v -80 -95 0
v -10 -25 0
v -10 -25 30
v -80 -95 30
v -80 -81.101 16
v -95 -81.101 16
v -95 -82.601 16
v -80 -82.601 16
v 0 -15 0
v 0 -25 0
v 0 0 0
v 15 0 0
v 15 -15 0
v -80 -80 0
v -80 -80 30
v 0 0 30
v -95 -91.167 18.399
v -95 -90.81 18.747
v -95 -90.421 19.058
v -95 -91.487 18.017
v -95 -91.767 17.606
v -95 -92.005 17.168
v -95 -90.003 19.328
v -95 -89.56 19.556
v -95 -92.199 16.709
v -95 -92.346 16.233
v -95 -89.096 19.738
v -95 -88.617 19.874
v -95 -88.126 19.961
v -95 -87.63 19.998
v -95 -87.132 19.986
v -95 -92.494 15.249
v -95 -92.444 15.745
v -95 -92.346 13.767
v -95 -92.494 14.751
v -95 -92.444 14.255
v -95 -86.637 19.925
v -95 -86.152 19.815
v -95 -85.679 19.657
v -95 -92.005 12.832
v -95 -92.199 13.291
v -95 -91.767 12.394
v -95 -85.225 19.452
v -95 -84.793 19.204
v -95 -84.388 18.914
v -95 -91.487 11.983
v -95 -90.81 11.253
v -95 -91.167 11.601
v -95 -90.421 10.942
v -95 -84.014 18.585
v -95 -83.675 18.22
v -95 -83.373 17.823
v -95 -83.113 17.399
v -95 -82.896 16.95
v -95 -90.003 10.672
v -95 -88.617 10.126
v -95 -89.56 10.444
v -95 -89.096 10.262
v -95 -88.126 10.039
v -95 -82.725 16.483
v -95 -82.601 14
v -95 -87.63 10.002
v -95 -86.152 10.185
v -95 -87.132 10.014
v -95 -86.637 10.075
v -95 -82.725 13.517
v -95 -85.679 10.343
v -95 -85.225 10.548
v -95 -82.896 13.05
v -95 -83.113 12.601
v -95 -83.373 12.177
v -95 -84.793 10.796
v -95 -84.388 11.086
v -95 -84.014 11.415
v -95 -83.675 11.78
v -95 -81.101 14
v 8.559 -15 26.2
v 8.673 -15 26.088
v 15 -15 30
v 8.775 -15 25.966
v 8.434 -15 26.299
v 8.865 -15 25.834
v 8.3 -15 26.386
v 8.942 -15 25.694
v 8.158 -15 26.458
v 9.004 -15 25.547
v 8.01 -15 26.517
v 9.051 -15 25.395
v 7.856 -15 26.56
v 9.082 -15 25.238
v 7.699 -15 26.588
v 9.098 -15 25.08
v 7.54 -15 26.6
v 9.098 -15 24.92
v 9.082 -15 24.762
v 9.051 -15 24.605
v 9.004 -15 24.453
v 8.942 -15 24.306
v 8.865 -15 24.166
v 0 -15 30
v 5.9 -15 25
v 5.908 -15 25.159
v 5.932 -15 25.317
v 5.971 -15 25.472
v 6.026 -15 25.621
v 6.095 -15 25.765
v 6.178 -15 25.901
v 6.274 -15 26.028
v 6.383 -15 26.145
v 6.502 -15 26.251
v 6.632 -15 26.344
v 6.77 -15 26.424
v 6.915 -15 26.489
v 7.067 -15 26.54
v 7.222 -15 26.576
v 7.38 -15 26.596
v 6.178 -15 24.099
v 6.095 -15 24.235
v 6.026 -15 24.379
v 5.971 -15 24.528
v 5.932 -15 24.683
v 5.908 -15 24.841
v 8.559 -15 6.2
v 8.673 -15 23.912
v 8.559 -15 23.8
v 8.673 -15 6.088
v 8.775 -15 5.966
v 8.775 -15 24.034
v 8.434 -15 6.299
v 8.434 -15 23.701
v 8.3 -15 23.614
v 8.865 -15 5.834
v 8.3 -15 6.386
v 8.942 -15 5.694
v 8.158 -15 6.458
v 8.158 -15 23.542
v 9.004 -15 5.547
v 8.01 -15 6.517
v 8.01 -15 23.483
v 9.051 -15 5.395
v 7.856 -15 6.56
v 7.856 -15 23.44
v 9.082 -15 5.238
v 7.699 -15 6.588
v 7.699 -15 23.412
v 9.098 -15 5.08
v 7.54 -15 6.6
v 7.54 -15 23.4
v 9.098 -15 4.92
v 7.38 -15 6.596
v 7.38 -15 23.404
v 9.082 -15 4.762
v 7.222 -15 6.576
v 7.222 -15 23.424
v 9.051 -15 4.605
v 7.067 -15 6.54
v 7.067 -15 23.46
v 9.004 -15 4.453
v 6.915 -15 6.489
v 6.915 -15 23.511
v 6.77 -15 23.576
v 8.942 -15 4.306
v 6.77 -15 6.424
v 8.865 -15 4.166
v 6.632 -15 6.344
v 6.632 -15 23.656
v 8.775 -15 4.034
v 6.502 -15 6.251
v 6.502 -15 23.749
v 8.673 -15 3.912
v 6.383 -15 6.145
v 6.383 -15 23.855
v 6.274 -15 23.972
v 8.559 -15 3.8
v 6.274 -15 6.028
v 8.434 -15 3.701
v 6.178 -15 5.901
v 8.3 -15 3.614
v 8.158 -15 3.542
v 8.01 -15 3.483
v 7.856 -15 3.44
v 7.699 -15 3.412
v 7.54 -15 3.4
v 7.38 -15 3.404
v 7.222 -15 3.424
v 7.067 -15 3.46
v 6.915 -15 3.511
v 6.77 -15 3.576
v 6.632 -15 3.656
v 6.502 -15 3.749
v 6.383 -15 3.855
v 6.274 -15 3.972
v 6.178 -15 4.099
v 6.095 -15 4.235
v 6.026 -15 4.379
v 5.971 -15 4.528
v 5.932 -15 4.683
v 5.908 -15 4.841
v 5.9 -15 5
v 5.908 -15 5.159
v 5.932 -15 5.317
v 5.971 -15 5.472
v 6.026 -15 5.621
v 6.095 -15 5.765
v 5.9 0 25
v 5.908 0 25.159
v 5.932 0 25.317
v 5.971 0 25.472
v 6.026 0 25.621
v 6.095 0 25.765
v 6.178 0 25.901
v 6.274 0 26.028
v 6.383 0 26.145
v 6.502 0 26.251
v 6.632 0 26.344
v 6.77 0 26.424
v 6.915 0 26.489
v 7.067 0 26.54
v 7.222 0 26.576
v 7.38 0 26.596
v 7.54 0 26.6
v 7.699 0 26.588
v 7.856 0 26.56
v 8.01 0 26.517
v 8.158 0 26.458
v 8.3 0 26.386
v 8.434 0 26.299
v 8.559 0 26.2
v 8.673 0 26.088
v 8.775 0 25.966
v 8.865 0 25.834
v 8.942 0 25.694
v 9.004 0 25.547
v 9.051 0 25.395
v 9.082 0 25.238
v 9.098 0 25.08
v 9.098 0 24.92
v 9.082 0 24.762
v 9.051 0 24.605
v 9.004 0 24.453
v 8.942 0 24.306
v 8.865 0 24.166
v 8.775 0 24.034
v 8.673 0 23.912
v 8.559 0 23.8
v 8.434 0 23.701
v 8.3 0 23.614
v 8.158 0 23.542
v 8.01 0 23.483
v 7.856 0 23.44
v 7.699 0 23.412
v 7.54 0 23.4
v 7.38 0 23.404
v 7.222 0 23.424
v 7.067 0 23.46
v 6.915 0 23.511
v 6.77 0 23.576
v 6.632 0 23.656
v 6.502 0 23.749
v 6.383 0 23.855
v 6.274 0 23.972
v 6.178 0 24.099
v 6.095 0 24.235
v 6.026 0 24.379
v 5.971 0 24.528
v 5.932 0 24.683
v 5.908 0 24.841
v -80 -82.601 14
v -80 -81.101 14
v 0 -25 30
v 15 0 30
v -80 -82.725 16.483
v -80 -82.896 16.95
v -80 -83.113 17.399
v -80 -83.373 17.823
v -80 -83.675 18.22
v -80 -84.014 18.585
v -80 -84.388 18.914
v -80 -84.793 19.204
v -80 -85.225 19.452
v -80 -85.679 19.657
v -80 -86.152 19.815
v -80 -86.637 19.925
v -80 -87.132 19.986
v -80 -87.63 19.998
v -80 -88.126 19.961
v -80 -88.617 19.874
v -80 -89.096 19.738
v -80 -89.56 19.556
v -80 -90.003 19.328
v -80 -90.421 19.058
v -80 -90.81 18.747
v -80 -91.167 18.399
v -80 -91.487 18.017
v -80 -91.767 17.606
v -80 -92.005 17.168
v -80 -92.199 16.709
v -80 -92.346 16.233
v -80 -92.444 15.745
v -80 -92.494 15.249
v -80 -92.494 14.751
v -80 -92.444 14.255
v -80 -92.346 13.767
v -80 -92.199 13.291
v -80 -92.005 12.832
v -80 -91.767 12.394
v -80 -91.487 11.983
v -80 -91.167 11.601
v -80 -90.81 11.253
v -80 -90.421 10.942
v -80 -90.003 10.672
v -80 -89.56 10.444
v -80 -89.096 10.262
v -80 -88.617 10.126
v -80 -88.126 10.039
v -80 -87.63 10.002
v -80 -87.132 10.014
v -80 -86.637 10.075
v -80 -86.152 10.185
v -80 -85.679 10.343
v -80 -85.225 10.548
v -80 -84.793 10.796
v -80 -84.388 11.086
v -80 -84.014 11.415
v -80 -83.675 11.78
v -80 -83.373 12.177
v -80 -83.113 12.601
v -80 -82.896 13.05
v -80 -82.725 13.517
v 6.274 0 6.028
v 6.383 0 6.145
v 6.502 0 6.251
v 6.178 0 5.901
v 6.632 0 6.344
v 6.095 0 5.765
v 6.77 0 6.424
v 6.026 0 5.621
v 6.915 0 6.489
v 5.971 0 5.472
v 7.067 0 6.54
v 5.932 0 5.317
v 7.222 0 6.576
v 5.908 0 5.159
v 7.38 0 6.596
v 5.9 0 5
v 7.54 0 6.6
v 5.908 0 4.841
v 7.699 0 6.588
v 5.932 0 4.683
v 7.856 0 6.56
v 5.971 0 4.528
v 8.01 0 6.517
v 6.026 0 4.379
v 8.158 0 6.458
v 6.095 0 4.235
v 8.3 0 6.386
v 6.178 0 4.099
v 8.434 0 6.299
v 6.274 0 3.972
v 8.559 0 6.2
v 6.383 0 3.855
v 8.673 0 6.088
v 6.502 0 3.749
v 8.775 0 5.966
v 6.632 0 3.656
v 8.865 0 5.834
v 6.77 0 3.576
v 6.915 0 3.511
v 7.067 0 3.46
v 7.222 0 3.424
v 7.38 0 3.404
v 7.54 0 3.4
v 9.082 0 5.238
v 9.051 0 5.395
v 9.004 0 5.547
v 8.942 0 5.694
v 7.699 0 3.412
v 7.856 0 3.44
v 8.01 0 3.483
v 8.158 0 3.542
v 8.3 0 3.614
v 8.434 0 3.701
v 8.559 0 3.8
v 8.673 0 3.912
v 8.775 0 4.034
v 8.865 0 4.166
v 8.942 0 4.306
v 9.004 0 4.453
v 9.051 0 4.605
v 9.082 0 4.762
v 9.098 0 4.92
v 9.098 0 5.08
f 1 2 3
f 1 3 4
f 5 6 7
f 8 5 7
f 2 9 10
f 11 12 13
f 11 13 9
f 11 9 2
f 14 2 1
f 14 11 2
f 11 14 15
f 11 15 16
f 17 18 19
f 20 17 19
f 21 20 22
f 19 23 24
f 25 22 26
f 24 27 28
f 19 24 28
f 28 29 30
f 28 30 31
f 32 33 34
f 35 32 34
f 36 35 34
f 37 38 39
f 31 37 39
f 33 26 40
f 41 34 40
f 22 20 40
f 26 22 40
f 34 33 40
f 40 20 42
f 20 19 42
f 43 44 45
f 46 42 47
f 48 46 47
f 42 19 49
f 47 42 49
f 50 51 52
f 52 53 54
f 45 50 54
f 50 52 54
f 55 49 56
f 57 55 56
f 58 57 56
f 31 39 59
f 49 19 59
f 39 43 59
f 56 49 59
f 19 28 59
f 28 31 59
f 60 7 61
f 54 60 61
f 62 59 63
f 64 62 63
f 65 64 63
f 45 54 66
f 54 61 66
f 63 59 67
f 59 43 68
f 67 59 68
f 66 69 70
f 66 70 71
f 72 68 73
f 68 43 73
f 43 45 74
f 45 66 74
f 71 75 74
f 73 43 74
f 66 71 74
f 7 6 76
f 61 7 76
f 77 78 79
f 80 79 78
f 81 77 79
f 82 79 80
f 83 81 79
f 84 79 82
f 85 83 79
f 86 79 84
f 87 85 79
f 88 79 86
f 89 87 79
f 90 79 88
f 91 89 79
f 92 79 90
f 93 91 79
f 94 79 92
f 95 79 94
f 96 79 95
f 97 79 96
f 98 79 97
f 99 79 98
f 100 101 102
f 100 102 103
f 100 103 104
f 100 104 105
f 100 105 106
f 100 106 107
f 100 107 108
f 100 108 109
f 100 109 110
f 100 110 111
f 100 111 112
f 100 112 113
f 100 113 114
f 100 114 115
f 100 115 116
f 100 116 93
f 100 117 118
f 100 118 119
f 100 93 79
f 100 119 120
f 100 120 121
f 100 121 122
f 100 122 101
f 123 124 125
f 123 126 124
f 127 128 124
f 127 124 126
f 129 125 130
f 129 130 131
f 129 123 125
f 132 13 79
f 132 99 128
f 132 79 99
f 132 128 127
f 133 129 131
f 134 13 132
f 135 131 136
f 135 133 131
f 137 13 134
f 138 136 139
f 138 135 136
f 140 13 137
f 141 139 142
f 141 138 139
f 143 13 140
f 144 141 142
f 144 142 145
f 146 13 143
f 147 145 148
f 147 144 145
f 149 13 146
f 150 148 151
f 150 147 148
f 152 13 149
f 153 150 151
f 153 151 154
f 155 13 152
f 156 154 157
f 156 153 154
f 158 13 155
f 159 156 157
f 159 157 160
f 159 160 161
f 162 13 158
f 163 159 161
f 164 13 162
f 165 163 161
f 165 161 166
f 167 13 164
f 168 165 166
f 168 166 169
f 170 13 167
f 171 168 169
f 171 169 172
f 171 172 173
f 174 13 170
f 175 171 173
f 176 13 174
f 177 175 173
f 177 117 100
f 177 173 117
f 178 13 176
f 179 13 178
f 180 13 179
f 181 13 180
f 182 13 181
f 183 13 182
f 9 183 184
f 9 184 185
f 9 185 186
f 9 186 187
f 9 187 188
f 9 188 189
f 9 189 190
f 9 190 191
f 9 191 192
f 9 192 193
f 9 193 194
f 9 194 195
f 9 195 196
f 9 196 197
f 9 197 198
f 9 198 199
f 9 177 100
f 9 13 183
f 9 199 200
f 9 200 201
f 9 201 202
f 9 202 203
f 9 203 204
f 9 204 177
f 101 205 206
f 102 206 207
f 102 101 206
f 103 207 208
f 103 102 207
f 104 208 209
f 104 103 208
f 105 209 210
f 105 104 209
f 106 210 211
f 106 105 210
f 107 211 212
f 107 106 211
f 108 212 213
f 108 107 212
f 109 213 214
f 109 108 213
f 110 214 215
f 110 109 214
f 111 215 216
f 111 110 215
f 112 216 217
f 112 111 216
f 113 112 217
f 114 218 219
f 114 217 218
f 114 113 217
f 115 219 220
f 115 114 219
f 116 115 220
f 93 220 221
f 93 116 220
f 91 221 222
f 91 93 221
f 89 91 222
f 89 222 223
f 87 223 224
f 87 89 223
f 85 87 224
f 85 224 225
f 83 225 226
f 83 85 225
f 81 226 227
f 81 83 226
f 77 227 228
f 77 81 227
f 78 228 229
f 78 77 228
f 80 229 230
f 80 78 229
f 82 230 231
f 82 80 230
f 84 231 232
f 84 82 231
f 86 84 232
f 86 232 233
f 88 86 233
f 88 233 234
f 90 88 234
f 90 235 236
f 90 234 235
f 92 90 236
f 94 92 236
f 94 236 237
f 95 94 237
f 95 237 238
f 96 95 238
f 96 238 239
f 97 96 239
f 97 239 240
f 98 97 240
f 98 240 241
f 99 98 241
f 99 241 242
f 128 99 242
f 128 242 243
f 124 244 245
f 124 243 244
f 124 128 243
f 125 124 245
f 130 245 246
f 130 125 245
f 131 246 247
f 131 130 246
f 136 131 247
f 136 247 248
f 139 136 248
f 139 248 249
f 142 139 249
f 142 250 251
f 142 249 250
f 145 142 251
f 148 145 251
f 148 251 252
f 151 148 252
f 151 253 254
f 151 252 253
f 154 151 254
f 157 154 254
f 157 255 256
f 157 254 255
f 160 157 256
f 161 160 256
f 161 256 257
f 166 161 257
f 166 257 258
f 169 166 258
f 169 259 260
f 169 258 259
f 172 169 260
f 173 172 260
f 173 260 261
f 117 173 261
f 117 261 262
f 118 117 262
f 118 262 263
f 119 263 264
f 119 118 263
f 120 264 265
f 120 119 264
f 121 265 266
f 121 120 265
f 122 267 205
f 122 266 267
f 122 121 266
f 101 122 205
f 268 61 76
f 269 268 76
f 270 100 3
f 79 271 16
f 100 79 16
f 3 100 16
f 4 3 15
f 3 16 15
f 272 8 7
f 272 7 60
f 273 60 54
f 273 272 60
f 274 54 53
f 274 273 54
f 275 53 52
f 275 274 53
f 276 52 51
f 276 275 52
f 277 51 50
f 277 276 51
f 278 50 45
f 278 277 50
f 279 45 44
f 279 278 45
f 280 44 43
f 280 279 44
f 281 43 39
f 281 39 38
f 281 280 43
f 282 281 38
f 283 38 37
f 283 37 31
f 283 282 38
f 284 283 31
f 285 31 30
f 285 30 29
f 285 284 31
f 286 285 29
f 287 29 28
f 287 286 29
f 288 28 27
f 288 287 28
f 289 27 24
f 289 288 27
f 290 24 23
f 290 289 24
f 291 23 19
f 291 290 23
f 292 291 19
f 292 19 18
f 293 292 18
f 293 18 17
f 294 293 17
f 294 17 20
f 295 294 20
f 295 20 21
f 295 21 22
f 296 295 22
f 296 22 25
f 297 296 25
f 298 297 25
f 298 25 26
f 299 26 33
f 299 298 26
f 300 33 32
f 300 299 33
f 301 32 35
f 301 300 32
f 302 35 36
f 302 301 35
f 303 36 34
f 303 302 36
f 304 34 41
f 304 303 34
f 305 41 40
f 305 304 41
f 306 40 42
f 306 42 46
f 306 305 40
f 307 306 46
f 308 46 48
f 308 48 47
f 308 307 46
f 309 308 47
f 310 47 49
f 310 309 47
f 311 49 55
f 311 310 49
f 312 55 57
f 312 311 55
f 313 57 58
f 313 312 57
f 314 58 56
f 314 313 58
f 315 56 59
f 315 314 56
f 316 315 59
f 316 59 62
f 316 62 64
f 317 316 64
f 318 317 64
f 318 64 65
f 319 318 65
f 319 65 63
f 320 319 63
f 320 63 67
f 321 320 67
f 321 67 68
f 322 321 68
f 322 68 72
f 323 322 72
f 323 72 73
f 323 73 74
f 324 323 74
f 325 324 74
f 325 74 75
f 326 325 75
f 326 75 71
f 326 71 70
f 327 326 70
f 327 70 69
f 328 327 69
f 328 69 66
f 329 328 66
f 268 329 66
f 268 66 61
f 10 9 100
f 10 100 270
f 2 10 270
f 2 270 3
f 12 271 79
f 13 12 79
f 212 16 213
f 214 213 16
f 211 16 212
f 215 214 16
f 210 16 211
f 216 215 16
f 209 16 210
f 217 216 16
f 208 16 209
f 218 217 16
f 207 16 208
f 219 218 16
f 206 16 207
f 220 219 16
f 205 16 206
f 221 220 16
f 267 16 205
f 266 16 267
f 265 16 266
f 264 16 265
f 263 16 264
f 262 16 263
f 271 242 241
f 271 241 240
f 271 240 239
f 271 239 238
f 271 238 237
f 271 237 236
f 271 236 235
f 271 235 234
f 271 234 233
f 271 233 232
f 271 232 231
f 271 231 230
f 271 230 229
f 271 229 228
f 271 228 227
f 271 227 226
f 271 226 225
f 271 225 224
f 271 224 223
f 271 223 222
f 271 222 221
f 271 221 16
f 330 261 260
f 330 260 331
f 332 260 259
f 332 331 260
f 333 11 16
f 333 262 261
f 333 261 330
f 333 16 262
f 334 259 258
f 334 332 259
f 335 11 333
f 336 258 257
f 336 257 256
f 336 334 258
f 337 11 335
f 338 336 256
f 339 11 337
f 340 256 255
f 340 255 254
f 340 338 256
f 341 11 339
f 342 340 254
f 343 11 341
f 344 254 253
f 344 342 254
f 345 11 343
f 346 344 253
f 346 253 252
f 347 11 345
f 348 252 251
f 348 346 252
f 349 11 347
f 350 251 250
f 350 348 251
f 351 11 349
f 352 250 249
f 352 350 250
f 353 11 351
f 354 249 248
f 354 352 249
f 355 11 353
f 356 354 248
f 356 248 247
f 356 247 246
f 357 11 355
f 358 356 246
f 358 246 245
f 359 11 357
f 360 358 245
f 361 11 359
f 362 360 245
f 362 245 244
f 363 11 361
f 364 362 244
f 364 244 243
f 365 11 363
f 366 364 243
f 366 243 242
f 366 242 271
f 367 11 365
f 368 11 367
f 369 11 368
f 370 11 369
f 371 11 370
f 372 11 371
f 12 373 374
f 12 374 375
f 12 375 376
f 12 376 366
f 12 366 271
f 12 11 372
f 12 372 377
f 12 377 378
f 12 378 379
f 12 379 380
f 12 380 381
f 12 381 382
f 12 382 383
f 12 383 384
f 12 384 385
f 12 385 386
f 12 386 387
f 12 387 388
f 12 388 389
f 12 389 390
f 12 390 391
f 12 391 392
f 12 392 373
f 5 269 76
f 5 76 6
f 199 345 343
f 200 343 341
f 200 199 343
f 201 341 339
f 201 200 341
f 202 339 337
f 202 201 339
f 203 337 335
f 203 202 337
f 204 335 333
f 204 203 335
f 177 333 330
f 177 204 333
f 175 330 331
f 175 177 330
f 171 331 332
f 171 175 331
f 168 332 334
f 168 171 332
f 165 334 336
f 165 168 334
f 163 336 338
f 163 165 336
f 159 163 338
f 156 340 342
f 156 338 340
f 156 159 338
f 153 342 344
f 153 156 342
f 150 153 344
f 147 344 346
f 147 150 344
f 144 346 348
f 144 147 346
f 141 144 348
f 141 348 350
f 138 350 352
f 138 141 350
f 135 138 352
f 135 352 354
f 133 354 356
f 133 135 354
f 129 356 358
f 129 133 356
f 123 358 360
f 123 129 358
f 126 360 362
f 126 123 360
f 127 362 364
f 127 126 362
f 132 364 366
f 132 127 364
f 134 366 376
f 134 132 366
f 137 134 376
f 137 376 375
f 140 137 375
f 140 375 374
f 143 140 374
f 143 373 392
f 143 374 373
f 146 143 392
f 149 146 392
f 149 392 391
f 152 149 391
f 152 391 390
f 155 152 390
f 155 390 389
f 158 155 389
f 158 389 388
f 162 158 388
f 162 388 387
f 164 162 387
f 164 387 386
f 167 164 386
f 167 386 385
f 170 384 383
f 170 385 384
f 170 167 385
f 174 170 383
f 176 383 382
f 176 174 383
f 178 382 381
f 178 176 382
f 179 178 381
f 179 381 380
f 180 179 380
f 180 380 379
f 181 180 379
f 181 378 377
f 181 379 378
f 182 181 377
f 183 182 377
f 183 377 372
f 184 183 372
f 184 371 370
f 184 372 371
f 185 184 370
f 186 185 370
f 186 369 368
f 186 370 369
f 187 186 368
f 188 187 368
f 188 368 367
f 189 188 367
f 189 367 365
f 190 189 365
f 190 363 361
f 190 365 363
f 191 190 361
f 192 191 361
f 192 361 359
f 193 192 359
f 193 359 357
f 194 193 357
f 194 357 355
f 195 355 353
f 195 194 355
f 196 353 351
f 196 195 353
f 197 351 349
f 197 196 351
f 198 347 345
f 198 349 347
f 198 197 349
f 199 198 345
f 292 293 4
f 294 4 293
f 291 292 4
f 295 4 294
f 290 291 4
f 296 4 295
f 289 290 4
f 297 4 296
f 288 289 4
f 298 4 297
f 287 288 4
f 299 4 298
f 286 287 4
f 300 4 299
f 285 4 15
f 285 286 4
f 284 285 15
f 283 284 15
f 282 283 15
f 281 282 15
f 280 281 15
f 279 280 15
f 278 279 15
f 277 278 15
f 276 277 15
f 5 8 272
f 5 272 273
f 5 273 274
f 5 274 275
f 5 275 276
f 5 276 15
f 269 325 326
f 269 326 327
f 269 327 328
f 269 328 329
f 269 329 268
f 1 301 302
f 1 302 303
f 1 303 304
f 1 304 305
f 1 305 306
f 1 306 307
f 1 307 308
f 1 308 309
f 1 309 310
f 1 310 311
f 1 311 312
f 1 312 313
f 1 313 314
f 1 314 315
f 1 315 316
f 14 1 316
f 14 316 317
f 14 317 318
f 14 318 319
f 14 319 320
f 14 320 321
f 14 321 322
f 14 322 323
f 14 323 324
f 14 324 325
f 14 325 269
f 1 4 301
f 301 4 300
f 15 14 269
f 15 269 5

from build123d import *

# Parameters (mm, degrees)
BOSS_EXTRUDE1_DEPTH     = 30
CUT_EXTRUDE1_DEPTH      = 128.769323392
CUT_EXTRUDE1_DEPTH_BACK = 15
SKETCH2_R               = 1.6
BOSS_EXTRUDE2_DEPTH     = 15


with BuildPart() as part:
    # Sketch1 → Boss-Extrude1 (new body)
    with BuildSketch(Plane.XY):
        Polygon((0, 0), (15, 0), (15, -15), (0, -15), (0, -25), (-10, -25), (-80, -95), (-80, -80), align=None)
    extrude(amount=BOSS_EXTRUDE1_DEPTH)

    # Sketch2 → Cut-Extrude1 (cut, two sides: drawn at the far end of the back side and taken through both)
    with BuildSketch(Plane(origin=(0, 0, 0), x_dir=(1, 0, 0), z_dir=(0, 1, 0)).offset(-CUT_EXTRUDE1_DEPTH_BACK)):
        with Locations(Location((7.5, -5, 0), (0, 0, 180))):
            Circle(SKETCH2_R)
        with Locations(Location((7.5, -25, 0), (0, 0, 180))):
            Circle(SKETCH2_R)
    extrude(amount=CUT_EXTRUDE1_DEPTH + CUT_EXTRUDE1_DEPTH_BACK, mode=Mode.SUBTRACT)

    # Sketch3 → Boss-Extrude2 (add)
    with BuildSketch(Plane.ZY.offset(80)):
        with BuildLine():
            Line((14, -82.601020514), (14, -81.101020514))
            Line((14, -81.101020514), (16, -81.101020514))
            Line((16, -81.101020514), (16, -82.601020514))
            ThreePointArc((16, -82.601020514), (15, -92.5), (14, -82.601020514))
        make_face()
    extrude(amount=BOSS_EXTRUDE2_DEPTH)


solid = part.part
